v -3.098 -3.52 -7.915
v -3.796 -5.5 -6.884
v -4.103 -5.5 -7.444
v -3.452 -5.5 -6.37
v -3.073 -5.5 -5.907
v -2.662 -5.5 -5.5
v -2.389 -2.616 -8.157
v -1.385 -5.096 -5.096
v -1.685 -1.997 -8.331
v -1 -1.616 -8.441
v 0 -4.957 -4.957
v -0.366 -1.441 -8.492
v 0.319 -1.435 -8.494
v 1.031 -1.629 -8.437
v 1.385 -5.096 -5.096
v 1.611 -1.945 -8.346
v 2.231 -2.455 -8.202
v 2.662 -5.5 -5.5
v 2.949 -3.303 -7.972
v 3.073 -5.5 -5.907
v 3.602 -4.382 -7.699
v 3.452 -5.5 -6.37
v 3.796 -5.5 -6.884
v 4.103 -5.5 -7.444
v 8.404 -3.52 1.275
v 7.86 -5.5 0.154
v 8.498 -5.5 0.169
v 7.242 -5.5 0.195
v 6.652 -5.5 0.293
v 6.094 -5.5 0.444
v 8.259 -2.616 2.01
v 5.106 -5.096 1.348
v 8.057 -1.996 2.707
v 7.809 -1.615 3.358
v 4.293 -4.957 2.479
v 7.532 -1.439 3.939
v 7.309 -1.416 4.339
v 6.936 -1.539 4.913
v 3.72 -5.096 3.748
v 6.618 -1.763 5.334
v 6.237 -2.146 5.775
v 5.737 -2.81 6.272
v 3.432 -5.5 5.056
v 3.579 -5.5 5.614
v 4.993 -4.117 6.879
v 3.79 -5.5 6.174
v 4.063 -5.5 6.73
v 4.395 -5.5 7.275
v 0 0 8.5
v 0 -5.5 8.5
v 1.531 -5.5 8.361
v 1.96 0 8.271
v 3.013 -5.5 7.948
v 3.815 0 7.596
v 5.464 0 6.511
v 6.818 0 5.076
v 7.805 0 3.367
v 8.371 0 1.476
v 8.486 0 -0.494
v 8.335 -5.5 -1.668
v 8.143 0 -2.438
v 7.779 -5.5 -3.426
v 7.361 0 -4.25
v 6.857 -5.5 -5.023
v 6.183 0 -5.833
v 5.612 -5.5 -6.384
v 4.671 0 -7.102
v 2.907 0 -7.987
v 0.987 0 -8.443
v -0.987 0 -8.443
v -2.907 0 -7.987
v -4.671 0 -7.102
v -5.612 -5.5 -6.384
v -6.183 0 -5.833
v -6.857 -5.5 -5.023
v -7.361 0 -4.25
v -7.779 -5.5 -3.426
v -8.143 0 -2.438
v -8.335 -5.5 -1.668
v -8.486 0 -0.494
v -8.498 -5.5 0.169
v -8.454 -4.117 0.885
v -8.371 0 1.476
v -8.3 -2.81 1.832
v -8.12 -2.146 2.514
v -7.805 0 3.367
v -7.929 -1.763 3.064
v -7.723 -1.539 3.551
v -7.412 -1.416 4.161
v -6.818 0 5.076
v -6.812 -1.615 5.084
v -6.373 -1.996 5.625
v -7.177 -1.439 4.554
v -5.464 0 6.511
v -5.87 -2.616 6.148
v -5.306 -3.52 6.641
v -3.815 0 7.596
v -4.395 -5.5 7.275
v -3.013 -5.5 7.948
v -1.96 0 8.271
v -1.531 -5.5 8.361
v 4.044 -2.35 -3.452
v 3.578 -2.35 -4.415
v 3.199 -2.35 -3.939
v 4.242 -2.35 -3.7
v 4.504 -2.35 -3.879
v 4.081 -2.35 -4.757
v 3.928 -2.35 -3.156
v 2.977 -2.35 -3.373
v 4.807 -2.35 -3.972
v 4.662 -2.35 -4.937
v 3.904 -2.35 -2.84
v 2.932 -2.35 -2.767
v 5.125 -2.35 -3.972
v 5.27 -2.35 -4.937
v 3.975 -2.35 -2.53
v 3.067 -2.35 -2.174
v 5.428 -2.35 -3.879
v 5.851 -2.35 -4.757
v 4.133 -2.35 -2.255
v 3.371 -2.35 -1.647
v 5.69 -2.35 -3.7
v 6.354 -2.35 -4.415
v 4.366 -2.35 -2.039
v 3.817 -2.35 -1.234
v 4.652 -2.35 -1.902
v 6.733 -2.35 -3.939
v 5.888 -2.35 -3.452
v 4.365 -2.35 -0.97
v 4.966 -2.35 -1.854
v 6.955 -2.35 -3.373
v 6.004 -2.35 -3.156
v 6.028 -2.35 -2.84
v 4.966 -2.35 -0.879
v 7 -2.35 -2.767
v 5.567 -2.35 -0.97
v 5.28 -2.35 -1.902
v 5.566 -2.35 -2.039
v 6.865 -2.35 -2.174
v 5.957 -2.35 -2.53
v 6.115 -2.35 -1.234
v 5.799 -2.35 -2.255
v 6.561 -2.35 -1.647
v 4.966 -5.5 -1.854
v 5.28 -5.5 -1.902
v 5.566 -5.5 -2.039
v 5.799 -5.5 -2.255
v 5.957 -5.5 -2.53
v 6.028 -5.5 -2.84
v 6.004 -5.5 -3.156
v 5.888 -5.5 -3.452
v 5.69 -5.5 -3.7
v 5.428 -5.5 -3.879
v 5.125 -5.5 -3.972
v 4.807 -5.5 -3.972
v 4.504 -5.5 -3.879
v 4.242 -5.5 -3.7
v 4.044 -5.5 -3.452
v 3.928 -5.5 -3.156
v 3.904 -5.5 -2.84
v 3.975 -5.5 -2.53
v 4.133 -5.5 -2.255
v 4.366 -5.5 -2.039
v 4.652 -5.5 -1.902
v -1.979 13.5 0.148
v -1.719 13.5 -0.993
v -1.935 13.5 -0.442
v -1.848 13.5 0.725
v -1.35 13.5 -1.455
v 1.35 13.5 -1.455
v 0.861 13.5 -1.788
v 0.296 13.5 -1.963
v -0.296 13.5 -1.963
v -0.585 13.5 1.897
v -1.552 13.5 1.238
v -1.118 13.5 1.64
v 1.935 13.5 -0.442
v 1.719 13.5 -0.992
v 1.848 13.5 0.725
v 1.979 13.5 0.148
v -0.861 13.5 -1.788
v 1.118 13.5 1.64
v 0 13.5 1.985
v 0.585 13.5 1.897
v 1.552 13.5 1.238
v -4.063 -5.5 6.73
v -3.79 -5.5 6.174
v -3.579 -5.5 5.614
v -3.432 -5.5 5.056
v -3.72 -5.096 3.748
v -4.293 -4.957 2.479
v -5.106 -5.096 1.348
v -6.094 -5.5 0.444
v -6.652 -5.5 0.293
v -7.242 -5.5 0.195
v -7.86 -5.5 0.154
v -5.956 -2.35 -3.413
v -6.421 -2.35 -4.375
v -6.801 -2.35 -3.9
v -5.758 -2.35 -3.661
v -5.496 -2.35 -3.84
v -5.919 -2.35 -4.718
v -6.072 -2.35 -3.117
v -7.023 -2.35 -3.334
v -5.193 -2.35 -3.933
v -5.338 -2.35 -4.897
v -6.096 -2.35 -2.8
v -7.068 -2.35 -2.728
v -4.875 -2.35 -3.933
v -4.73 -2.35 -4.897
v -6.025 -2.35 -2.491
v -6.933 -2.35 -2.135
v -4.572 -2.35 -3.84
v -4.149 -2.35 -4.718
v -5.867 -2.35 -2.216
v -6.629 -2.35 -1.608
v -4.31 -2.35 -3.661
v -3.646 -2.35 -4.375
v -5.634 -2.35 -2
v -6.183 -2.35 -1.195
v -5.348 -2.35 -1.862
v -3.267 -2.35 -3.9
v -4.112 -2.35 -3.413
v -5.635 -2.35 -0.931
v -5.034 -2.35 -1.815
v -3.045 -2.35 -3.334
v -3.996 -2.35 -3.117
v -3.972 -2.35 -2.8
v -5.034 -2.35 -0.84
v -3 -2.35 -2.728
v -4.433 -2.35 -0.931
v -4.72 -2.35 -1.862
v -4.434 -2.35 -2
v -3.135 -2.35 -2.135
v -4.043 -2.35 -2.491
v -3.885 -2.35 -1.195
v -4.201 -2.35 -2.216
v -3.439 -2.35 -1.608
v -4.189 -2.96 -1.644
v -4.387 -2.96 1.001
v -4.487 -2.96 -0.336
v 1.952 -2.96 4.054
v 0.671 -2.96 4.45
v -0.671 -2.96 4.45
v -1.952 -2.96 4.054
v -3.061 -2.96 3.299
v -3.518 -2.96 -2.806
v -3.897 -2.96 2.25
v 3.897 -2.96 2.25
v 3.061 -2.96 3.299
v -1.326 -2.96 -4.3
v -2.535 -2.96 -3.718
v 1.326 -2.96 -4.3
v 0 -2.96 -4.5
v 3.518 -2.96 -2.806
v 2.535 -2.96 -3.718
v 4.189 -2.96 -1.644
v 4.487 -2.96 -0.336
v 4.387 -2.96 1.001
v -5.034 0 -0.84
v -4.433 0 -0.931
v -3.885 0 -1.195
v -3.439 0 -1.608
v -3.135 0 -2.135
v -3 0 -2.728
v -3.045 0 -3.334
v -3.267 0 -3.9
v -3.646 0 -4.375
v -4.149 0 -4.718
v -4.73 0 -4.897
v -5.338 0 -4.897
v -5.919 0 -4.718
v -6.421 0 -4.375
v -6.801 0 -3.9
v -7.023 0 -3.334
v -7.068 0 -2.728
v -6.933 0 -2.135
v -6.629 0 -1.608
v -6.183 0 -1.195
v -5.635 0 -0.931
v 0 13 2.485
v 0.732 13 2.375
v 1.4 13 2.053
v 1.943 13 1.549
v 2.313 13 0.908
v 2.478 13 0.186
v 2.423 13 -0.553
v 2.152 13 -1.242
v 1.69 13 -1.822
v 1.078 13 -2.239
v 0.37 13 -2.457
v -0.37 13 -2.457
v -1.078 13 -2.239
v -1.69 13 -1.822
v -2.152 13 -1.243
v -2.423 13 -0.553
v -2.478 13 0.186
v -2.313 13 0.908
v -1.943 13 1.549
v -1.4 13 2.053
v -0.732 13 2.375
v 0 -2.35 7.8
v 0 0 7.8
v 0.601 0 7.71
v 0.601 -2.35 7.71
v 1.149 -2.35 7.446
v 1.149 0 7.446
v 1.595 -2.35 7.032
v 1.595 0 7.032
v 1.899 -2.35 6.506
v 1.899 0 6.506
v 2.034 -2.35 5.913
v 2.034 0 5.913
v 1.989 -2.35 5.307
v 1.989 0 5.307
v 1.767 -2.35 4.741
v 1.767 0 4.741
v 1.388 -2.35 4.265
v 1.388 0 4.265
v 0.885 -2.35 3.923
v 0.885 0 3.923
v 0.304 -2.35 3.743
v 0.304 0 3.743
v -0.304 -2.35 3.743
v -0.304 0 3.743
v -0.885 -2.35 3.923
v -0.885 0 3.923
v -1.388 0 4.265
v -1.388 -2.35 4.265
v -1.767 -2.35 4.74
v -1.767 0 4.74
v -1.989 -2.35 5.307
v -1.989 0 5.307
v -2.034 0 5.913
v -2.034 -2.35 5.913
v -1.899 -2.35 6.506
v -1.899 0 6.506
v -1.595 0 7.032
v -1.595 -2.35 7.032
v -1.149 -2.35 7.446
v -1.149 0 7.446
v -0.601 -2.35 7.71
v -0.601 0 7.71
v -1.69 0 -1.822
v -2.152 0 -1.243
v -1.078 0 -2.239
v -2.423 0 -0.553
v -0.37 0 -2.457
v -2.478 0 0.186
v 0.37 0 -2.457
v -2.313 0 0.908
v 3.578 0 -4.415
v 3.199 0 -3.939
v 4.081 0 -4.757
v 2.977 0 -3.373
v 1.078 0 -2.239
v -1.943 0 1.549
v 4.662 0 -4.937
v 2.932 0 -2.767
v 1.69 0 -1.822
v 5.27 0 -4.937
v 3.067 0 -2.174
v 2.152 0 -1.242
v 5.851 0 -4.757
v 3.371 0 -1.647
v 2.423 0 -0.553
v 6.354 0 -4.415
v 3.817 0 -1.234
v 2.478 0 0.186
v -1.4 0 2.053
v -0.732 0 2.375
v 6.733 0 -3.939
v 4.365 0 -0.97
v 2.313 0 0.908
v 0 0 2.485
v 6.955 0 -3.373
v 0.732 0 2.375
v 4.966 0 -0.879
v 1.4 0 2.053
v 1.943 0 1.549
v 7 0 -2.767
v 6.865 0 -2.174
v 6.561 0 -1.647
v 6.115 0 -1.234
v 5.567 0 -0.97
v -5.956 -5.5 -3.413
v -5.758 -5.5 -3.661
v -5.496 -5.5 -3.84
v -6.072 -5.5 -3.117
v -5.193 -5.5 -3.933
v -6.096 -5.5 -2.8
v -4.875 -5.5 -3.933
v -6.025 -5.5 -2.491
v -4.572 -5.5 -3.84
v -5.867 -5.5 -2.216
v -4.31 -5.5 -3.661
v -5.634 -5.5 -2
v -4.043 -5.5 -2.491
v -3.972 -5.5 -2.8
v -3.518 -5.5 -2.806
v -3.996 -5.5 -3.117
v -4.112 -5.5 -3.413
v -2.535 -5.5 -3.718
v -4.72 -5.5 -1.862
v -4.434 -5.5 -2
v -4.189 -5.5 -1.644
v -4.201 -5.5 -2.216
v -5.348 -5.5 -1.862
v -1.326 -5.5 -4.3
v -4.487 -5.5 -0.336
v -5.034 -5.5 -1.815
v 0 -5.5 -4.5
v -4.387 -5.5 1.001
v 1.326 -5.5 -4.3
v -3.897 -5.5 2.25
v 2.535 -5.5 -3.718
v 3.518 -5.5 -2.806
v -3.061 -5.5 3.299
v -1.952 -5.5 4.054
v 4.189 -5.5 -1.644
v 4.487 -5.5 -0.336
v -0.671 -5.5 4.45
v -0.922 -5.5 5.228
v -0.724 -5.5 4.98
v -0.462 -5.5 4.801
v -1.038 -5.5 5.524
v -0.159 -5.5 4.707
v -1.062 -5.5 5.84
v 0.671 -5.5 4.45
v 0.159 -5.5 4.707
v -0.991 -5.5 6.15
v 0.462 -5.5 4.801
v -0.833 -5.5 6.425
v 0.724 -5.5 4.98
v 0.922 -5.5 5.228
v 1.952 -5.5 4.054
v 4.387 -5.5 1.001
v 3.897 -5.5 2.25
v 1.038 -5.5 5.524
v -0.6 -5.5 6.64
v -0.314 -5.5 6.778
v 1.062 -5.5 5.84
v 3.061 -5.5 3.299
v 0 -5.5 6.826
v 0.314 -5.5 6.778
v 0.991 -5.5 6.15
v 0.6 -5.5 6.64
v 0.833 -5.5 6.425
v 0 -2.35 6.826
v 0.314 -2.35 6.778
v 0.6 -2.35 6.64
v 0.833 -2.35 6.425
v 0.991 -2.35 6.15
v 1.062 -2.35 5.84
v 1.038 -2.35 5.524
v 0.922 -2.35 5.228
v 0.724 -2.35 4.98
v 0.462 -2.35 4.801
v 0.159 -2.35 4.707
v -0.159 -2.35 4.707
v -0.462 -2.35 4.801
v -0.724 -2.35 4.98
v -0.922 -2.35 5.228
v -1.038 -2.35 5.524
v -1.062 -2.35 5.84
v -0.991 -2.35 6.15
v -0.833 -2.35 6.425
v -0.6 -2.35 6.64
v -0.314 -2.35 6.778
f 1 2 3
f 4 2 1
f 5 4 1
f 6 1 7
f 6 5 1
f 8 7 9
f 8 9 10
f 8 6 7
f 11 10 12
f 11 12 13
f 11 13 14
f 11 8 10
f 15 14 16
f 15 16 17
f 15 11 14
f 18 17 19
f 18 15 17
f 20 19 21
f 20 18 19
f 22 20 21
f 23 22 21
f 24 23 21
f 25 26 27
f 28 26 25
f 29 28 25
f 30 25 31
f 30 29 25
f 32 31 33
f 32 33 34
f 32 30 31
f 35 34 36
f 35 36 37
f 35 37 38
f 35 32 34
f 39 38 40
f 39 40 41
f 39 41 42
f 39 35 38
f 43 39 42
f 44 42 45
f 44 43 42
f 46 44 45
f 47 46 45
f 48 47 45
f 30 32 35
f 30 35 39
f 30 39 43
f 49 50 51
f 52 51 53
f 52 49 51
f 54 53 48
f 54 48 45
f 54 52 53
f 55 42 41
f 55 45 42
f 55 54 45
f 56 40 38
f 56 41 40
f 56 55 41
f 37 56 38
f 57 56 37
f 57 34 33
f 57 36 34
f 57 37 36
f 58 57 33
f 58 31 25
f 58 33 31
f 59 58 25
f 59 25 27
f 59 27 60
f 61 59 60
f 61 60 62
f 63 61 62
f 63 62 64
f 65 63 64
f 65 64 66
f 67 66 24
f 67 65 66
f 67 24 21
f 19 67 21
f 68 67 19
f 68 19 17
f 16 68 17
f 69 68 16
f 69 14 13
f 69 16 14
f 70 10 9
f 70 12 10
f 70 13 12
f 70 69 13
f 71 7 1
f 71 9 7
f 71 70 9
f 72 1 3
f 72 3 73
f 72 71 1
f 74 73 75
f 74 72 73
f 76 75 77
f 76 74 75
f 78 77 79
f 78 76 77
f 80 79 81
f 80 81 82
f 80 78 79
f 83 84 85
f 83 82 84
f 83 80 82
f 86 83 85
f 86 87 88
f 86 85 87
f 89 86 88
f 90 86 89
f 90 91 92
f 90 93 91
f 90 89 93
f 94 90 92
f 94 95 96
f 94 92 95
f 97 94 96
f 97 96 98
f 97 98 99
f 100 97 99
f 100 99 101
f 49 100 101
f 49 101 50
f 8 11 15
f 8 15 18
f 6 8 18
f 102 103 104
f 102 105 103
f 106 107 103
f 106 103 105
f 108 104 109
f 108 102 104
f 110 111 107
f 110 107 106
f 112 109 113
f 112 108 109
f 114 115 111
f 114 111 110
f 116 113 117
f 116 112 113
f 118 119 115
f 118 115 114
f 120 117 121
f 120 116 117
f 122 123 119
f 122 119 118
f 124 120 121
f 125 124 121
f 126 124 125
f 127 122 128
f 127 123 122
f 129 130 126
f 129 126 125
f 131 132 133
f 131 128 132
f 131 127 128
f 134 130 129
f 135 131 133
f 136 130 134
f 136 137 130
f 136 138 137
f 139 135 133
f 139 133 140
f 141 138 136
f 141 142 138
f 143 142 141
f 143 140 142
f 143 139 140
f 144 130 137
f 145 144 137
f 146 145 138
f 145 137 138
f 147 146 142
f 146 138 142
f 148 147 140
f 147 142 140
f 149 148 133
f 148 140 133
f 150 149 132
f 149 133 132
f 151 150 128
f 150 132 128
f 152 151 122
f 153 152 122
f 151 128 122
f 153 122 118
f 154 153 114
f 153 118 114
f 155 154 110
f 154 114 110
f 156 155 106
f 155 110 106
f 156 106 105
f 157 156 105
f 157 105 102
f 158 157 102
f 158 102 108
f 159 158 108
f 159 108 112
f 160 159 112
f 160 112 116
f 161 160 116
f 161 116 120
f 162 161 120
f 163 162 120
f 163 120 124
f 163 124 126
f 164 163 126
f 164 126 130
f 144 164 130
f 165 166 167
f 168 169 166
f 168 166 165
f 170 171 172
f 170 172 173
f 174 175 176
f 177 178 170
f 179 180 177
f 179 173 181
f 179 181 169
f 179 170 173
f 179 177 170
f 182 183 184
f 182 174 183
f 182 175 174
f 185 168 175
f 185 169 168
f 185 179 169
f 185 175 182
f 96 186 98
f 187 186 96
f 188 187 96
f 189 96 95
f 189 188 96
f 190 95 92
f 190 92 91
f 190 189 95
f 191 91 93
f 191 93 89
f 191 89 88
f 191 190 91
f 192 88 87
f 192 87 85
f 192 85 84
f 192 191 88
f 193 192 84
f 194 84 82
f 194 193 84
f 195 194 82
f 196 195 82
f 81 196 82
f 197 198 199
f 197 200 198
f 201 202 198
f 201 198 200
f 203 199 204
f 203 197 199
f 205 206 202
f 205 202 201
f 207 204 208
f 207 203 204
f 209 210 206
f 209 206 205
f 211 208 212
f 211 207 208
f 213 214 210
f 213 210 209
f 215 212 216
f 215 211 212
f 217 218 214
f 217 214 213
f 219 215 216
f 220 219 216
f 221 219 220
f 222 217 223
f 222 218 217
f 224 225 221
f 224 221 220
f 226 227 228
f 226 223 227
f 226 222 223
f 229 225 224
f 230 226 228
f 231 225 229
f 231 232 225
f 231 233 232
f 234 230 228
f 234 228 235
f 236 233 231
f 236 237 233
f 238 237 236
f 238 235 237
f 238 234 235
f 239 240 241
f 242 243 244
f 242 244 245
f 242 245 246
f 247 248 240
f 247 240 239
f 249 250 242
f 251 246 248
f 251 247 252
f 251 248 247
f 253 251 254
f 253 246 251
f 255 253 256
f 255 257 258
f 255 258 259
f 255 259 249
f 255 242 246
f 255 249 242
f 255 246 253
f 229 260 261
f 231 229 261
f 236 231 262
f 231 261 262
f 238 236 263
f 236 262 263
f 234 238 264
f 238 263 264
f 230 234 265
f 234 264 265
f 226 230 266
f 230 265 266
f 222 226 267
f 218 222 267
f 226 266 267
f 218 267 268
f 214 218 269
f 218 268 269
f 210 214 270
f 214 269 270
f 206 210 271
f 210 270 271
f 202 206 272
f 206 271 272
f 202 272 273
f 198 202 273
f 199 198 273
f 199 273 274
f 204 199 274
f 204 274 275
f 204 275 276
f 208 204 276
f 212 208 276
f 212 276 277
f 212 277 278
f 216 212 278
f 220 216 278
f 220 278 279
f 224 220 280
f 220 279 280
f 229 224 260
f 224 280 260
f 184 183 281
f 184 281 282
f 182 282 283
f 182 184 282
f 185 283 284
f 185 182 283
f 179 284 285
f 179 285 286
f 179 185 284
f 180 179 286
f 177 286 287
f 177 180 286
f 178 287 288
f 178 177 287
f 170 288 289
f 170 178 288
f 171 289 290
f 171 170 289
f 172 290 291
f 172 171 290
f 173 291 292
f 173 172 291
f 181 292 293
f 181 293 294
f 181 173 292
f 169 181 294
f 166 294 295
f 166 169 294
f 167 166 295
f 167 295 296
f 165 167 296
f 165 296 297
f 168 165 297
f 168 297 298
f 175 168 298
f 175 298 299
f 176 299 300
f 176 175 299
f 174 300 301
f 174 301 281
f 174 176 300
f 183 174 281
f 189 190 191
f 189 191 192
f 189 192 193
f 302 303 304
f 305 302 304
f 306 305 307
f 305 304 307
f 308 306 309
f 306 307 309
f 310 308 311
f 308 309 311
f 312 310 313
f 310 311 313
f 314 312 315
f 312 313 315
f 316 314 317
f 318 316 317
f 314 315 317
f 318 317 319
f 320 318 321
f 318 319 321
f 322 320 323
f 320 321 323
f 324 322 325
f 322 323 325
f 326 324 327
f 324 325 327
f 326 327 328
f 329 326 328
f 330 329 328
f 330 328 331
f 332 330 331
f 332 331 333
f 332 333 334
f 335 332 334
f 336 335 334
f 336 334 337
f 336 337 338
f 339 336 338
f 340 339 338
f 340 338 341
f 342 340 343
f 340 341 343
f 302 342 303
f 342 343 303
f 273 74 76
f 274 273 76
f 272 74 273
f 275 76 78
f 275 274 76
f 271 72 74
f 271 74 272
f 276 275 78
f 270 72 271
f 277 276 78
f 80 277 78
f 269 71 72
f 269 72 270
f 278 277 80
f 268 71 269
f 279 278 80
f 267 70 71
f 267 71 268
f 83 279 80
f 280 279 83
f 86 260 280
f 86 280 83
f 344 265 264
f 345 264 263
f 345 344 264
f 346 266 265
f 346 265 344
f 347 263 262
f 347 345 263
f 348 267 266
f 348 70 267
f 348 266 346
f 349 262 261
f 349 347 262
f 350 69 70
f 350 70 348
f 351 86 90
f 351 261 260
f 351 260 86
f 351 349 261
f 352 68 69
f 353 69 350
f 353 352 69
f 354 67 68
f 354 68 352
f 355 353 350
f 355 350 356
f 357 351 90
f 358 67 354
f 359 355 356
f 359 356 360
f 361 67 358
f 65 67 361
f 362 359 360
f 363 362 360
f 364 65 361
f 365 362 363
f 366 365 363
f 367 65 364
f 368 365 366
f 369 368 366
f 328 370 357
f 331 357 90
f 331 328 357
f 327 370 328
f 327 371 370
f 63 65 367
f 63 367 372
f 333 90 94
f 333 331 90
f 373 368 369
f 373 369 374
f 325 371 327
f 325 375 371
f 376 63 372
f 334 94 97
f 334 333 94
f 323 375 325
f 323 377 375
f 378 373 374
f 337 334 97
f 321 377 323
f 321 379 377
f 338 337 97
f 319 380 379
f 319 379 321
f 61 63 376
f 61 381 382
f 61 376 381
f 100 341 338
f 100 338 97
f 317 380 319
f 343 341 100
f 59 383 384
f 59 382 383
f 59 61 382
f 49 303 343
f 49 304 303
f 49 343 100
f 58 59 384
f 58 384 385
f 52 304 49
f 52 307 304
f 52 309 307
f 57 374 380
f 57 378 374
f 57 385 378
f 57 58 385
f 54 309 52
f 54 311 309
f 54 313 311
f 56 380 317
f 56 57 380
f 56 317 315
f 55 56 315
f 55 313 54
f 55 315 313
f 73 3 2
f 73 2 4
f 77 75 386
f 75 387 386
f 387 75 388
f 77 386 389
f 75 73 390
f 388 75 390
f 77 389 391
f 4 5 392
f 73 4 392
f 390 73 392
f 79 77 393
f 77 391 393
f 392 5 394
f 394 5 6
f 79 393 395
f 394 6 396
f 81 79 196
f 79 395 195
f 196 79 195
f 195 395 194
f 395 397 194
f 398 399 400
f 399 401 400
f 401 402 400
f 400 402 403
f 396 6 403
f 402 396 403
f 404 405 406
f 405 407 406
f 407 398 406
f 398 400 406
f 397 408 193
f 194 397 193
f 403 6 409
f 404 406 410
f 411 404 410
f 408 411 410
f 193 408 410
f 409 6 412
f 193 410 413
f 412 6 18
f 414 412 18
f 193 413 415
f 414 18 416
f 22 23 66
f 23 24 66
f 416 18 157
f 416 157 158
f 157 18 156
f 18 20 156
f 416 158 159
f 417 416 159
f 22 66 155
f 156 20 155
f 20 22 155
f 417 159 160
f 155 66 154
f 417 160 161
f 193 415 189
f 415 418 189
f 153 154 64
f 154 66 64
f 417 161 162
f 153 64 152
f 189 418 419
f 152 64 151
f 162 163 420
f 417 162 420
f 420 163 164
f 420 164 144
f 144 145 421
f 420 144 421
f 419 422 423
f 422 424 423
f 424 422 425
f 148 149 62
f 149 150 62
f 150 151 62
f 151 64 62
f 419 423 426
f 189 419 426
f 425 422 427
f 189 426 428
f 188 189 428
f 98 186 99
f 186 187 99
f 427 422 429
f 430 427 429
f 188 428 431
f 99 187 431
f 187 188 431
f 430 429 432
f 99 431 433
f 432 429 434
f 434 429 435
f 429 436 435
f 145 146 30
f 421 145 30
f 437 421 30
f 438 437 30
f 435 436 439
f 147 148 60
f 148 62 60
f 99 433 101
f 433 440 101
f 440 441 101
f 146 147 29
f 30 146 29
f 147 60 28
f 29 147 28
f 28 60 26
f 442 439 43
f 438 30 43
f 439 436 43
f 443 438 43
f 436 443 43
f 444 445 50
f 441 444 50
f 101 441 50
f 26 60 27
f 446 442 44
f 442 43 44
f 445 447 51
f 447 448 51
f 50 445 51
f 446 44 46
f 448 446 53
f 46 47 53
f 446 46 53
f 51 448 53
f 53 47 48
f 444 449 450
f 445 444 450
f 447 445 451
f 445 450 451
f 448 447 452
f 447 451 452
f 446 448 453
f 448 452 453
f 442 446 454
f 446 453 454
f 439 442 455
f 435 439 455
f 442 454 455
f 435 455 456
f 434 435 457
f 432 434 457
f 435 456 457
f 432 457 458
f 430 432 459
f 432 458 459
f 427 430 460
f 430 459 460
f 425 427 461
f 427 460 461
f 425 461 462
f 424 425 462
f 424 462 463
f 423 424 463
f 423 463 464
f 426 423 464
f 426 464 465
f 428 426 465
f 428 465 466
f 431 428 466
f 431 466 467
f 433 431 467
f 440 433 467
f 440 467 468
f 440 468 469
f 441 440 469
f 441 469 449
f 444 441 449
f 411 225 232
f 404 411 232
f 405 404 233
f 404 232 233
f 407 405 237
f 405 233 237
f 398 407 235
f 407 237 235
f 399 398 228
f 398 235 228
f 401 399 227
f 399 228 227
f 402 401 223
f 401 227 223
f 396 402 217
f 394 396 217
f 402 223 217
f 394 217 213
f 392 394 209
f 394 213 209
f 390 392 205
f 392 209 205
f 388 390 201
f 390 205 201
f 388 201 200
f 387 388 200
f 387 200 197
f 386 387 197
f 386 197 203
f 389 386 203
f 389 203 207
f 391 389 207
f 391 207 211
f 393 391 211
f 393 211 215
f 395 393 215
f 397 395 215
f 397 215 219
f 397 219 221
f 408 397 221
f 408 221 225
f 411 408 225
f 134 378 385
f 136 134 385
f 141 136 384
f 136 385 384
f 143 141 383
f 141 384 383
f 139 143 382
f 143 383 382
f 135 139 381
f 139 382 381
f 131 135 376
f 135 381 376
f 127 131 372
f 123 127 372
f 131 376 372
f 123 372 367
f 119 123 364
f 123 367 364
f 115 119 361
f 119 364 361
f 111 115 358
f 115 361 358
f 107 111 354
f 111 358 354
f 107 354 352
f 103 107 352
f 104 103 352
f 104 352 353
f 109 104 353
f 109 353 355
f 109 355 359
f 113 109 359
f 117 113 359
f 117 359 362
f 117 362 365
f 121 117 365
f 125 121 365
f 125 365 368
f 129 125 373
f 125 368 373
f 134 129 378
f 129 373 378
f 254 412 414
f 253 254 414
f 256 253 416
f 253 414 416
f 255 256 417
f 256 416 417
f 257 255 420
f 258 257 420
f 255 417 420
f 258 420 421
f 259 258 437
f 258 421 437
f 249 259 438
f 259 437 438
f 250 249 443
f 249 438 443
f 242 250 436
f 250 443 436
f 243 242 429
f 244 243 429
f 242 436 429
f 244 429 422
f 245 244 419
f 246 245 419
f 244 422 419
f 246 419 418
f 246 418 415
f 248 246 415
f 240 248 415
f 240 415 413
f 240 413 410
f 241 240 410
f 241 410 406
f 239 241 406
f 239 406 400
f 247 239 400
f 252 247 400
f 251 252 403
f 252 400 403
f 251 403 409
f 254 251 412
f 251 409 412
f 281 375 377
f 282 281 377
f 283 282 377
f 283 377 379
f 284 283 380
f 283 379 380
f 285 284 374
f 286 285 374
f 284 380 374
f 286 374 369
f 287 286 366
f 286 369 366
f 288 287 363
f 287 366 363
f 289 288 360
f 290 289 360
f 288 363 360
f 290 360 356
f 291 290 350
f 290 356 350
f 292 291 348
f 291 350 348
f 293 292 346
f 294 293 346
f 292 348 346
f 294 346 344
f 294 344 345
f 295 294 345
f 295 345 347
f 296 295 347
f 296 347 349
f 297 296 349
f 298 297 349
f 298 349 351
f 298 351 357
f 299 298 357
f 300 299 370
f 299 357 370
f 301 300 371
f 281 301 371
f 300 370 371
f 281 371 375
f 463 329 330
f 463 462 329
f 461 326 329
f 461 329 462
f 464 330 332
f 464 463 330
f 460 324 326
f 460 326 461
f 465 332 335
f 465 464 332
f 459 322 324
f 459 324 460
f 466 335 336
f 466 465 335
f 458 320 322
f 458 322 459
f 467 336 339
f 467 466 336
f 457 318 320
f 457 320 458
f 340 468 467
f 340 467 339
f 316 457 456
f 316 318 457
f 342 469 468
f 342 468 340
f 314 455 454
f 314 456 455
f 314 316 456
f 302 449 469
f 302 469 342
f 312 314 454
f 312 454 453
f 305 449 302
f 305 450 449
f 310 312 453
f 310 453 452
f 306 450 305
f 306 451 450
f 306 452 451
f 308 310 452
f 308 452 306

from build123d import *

# Parameters (mm, degrees)
SKETCH1_R           = 8.5
BOSS_EXTRUDE1_DEPTH = 5.5
SKETCH10_R          = 2.485
BOSS_EXTRUDE3_DEPTH = 13.5
SKETCH12_R          = 4.5
CUT_EXTRUDE4_DEPTH  = 2.54
CHAMFER2_SIZE       = 0.5
SKETCH14_R          = 2.04
CUT_EXTRUDE5_DEPTH  = 2.35
SKETCH15_R          = 1.065
CUT_EXTRUDE6_DEPTH  = 19.076227483
SKETCH16_R          = 5
CUT_EXTRUDE7_DEPTH  = 10
CIRPATTERN1_COUNT   = 3


with BuildPart() as part:
    # Sketch1 → Boss-Extrude1 (new body)
    with BuildSketch(Plane(origin=(0, 0, 0), x_dir=(1, 0, 0), z_dir=(0, 1, 0))):
        with Locations(Location((0, 0, 0), (0, 0, 270))):
            Circle(SKETCH1_R)
    extrude(amount=-BOSS_EXTRUDE1_DEPTH)

    # Sketch10 → Boss-Extrude3 (add)
    with BuildSketch(Plane(origin=(0, 0, 0), x_dir=(1, 0, 0), z_dir=(0, 1, 0))):
        with Locations(Location((0, 0, 0), (0, 0, 270))):
            Circle(SKETCH10_R)
    extrude(amount=BOSS_EXTRUDE3_DEPTH)

    # Sketch12 → Cut-Extrude4 (cut)
    with BuildSketch(Plane.XZ.offset(5.5)):
        with Locations(Location((0, 0, 0), (0, 0, 270))):
            Circle(SKETCH12_R)
    extrude(amount=-CUT_EXTRUDE4_DEPTH, mode=Mode.SUBTRACT)

    # Chamfer2
    chamfer2_edges = [part.edges().sort_by_distance(p)[0] for p in [
        (0, 13.5, -2.485),
    ]]
    chamfer(chamfer2_edges, length=CHAMFER2_SIZE)

    # Sketch14 → Cut-Extrude5 (cut)
    with BuildSketch(Plane(origin=(0, 0, 0), x_dir=(1, 0, 0), z_dir=(0, 1, 0))):
        with Locations(Location((0, -5.7605, 0), (0, 0, 270))):
            Circle(SKETCH14_R)
        with Locations(Location((-5.033935185, 2.880072698, 0), (0, 0, 270))):
            Circle(SKETCH14_R)
        with Locations(Location((4.965987867, 2.919302101, 0), (0, 0, 270))):
            Circle(SKETCH14_R)
    extrude(amount=-CUT_EXTRUDE5_DEPTH, mode=Mode.SUBTRACT)

    # Sketch15 → Cut-Extrude6 (cut, through all)
    with BuildSketch(Plane(origin=(0, 0, 0), x_dir=(1, 0, 0), z_dir=(0, 1, 0))):
        with Locations(Location((4.965987867, 2.919302101, 0), (0, 0, 270))):
            Circle(SKETCH15_R)
        with Locations(Location((-5.033935185, 2.880072698, 0), (0, 0, 270))):
            Circle(SKETCH15_R)
        with Locations(Location((0, -5.7605, 0), (0, 0, 270))):
            Circle(SKETCH15_R)
    extrude(amount=-CUT_EXTRUDE6_DEPTH, mode=Mode.SUBTRACT)

    # Sketch16 → Cut-Extrude7 (cut)
    with BuildSketch(Plane(origin=(0, 0, 0), x_dir=(-1, 0, 0), z_dir=(0, 0.7071067811865475, -0.7071067811865477))):
        with Locations((0, -12.01040764)):
            Circle(SKETCH16_R)
    cut_extrude7 = extrude(amount=CUT_EXTRUDE7_DEPTH, mode=Mode.SUBTRACT)

    # CirPattern1: Cut-Extrude7 ×3 about axis
    cirpattern1_axis = Axis((0, 0, 0), (0, 1, 0))
    for i in range(1, CIRPATTERN1_COUNT):
        add(cut_extrude7.rotate(cirpattern1_axis, i * 360 / CIRPATTERN1_COUNT), mode=Mode.SUBTRACT)


solid = part.part
